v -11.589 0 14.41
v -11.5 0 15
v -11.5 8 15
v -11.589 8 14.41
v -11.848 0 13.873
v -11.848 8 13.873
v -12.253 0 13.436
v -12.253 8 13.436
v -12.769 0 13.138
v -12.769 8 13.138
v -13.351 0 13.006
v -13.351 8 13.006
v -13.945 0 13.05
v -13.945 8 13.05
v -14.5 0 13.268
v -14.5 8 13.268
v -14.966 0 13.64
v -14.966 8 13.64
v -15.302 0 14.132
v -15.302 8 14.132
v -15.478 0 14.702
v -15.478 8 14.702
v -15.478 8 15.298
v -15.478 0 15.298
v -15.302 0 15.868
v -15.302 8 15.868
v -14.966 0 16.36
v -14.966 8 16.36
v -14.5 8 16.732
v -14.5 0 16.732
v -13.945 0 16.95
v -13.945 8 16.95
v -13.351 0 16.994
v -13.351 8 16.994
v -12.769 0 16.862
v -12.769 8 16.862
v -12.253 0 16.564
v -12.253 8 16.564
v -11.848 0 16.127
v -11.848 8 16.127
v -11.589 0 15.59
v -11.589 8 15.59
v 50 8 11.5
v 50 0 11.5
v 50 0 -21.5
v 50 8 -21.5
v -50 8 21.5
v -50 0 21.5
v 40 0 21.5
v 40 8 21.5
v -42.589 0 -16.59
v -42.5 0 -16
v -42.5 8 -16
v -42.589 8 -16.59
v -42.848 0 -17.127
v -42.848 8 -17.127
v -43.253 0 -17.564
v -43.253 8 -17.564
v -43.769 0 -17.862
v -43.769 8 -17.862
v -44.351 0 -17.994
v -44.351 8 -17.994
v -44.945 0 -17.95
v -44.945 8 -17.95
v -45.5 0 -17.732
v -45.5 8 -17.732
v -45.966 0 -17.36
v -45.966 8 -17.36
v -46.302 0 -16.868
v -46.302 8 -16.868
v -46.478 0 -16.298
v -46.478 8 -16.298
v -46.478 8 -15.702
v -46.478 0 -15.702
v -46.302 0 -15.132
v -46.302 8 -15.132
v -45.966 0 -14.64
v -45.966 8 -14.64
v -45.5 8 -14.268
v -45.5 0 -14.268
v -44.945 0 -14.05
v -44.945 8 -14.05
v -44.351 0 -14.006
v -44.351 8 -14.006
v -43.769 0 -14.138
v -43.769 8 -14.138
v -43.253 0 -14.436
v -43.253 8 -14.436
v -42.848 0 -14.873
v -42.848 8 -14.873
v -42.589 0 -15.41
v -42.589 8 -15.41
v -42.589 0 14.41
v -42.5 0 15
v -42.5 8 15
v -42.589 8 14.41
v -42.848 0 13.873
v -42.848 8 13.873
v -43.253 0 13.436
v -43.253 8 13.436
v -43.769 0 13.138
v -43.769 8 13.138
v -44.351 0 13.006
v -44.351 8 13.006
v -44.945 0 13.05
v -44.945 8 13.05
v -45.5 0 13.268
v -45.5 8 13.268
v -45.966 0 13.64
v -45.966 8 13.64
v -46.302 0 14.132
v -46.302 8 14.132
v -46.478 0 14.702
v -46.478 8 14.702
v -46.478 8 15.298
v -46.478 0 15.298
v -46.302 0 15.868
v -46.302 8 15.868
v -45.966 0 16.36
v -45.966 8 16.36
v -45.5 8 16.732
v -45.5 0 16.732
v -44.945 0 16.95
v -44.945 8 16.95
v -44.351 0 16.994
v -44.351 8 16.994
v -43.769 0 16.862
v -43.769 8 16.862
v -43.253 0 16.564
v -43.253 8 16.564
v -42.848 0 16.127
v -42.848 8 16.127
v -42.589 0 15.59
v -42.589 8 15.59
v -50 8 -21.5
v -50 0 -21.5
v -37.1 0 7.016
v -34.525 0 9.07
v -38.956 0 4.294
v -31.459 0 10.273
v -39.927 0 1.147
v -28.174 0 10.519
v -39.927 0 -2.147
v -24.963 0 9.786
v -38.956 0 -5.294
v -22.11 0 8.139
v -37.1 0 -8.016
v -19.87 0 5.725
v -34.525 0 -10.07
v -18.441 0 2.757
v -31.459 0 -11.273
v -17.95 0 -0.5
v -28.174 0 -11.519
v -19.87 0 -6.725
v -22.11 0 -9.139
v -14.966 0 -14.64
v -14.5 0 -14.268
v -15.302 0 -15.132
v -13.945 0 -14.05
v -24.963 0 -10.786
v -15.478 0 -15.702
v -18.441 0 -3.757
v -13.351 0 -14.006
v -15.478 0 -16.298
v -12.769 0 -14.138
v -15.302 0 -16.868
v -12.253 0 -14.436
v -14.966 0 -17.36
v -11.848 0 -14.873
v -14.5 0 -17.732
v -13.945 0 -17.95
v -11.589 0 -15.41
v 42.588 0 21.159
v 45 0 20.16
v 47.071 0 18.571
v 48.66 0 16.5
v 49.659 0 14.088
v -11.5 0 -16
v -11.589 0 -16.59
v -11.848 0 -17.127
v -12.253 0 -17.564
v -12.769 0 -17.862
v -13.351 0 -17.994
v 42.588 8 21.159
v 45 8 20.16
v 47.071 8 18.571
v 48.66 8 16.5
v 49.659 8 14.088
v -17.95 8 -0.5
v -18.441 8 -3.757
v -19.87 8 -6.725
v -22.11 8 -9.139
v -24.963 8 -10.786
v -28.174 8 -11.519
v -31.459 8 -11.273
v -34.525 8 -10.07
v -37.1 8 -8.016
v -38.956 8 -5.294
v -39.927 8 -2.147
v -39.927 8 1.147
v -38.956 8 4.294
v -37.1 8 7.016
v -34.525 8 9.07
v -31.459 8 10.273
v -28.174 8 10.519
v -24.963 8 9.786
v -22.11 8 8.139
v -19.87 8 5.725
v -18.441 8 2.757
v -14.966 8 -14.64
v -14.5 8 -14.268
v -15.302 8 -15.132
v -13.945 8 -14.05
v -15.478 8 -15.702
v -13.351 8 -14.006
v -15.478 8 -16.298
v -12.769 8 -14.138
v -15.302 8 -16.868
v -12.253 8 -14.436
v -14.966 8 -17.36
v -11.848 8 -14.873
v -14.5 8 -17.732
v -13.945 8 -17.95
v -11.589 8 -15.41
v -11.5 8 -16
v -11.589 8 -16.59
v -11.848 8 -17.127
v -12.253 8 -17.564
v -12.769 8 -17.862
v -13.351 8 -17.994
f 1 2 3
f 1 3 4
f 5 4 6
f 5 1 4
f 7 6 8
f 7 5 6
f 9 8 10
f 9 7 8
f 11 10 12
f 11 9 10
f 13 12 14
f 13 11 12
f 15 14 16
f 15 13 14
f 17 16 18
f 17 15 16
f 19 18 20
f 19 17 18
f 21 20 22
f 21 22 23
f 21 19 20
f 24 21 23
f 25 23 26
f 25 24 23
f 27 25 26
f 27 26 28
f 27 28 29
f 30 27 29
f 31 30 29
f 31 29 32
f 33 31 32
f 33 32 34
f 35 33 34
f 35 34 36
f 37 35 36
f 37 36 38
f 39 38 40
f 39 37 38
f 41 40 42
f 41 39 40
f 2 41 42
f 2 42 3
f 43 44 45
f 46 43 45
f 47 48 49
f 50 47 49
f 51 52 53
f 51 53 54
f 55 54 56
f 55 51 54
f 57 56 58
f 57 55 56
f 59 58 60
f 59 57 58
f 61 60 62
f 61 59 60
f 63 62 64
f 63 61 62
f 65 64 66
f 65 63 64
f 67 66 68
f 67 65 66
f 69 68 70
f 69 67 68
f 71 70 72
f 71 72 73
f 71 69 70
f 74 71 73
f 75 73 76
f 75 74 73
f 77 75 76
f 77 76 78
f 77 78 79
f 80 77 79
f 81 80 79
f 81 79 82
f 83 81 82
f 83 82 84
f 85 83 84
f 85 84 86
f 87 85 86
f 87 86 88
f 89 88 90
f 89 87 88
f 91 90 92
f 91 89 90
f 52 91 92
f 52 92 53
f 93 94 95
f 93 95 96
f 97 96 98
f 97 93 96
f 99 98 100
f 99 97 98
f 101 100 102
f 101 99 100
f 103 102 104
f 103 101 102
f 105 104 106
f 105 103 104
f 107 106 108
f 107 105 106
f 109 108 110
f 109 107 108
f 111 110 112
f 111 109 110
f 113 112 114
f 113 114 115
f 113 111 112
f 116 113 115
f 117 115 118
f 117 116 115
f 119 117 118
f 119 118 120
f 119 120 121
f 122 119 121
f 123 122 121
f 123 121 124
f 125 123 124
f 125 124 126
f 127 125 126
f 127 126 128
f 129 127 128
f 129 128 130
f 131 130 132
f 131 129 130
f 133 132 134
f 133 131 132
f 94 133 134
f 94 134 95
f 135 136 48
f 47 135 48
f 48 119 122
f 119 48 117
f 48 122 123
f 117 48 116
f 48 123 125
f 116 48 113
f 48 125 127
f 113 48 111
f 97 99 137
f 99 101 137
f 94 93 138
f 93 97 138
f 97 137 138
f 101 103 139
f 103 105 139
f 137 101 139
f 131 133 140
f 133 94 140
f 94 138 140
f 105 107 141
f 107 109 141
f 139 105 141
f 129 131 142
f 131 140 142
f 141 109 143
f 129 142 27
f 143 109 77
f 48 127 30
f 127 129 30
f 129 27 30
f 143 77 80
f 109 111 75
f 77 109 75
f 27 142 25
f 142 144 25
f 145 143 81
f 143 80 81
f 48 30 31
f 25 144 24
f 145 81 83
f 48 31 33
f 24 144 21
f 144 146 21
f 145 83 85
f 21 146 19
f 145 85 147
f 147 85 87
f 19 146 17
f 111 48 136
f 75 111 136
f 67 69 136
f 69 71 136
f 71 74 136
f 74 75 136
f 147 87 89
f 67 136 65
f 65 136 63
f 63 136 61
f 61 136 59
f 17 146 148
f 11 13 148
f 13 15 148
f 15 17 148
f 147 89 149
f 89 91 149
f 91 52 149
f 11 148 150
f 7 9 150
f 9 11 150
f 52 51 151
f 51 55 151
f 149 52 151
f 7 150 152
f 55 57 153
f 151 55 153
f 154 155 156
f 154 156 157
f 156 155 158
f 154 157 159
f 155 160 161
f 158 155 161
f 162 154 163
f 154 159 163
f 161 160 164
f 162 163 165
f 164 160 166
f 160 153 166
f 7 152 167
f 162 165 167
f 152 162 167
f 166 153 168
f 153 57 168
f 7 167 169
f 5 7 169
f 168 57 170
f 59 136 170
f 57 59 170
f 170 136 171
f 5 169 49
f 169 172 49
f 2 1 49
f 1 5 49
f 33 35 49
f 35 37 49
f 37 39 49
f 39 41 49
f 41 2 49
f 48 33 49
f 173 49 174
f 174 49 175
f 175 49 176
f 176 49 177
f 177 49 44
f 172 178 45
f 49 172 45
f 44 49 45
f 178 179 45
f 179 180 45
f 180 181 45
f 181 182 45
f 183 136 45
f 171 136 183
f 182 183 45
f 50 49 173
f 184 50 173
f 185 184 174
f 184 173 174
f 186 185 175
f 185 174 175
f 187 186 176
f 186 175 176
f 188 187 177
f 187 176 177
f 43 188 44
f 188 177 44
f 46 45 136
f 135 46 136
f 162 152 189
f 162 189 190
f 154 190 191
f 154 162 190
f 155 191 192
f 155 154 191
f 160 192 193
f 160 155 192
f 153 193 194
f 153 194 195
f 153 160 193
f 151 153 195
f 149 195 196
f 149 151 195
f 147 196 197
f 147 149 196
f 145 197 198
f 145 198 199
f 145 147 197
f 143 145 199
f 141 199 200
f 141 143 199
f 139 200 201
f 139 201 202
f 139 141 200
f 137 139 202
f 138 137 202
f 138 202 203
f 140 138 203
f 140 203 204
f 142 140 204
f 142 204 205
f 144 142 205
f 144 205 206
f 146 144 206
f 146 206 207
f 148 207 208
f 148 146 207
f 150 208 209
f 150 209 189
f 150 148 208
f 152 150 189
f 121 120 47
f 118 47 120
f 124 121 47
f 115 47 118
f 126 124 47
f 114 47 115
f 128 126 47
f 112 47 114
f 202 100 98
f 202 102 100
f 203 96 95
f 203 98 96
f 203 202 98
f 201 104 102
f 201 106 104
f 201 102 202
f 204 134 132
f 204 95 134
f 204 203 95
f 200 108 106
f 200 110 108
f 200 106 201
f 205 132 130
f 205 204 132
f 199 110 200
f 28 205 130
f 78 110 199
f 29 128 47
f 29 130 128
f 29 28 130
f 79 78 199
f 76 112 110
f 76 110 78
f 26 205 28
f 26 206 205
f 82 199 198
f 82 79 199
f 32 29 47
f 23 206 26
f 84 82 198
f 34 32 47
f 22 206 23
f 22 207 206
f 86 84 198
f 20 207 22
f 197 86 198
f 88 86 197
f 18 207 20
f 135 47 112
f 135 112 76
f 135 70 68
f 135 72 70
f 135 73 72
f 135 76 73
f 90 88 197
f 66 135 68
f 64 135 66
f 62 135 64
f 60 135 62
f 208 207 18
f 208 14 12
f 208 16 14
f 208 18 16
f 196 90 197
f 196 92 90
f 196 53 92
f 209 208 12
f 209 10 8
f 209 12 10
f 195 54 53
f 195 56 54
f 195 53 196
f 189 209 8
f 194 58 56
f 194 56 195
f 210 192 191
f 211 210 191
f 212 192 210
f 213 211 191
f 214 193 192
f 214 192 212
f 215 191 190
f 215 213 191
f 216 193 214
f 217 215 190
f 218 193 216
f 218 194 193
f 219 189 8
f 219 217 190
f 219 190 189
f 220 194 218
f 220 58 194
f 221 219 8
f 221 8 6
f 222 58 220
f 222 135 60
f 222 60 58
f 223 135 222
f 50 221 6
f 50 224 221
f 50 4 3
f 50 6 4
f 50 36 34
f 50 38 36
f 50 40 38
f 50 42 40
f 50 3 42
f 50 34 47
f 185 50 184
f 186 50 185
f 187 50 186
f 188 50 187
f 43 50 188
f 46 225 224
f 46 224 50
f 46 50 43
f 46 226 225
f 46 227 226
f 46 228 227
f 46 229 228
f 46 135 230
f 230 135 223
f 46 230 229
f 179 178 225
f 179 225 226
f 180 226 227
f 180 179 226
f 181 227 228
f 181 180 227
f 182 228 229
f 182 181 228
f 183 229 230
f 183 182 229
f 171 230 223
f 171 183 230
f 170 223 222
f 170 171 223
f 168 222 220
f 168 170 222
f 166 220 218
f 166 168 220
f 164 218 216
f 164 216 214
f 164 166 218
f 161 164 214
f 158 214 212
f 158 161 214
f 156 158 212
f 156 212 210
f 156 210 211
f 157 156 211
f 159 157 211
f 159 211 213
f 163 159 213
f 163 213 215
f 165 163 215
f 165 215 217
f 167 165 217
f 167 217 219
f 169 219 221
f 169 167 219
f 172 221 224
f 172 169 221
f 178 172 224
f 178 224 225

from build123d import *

# Parameters (mm, degrees)
SKETCH_1_R      = 11.05
SKETCH_1_R_2    = 2
EXTRUDE_1_DEPTH = 8


with BuildPart() as part:
    # Эскиз1 → Бобышка-Вытянуть1 (new body)
    with BuildSketch(Plane(origin=(0, 0, 0), x_dir=(1, 0, 0), z_dir=(0, 1, 0))):
        with BuildLine():
            Line((-50, -21.5), (40, -21.5))
            ThreePointArc((40, -21.5), (47.071067812, -18.571067812), (50, -11.5))
            Line((50, -11.5), (50, 21.5))
            Line((50, 21.5), (-50, 21.5))
            Line((-50, 21.5), (-50, -21.5))
        make_face()
        with Locations((-29, 0.5)):
            Circle(SKETCH_1_R, mode=Mode.SUBTRACT)
        with Locations((-13.5, -15)):
            Circle(SKETCH_1_R_2, mode=Mode.SUBTRACT)
        with Locations((-13.5, 16)):
            Circle(SKETCH_1_R_2, mode=Mode.SUBTRACT)
        with Locations((-44.5, -15)):
            Circle(SKETCH_1_R_2, mode=Mode.SUBTRACT)
        with Locations((-44.5, 16)):
            Circle(SKETCH_1_R_2, mode=Mode.SUBTRACT)
    extrude(amount=EXTRUDE_1_DEPTH)


solid = part.part
